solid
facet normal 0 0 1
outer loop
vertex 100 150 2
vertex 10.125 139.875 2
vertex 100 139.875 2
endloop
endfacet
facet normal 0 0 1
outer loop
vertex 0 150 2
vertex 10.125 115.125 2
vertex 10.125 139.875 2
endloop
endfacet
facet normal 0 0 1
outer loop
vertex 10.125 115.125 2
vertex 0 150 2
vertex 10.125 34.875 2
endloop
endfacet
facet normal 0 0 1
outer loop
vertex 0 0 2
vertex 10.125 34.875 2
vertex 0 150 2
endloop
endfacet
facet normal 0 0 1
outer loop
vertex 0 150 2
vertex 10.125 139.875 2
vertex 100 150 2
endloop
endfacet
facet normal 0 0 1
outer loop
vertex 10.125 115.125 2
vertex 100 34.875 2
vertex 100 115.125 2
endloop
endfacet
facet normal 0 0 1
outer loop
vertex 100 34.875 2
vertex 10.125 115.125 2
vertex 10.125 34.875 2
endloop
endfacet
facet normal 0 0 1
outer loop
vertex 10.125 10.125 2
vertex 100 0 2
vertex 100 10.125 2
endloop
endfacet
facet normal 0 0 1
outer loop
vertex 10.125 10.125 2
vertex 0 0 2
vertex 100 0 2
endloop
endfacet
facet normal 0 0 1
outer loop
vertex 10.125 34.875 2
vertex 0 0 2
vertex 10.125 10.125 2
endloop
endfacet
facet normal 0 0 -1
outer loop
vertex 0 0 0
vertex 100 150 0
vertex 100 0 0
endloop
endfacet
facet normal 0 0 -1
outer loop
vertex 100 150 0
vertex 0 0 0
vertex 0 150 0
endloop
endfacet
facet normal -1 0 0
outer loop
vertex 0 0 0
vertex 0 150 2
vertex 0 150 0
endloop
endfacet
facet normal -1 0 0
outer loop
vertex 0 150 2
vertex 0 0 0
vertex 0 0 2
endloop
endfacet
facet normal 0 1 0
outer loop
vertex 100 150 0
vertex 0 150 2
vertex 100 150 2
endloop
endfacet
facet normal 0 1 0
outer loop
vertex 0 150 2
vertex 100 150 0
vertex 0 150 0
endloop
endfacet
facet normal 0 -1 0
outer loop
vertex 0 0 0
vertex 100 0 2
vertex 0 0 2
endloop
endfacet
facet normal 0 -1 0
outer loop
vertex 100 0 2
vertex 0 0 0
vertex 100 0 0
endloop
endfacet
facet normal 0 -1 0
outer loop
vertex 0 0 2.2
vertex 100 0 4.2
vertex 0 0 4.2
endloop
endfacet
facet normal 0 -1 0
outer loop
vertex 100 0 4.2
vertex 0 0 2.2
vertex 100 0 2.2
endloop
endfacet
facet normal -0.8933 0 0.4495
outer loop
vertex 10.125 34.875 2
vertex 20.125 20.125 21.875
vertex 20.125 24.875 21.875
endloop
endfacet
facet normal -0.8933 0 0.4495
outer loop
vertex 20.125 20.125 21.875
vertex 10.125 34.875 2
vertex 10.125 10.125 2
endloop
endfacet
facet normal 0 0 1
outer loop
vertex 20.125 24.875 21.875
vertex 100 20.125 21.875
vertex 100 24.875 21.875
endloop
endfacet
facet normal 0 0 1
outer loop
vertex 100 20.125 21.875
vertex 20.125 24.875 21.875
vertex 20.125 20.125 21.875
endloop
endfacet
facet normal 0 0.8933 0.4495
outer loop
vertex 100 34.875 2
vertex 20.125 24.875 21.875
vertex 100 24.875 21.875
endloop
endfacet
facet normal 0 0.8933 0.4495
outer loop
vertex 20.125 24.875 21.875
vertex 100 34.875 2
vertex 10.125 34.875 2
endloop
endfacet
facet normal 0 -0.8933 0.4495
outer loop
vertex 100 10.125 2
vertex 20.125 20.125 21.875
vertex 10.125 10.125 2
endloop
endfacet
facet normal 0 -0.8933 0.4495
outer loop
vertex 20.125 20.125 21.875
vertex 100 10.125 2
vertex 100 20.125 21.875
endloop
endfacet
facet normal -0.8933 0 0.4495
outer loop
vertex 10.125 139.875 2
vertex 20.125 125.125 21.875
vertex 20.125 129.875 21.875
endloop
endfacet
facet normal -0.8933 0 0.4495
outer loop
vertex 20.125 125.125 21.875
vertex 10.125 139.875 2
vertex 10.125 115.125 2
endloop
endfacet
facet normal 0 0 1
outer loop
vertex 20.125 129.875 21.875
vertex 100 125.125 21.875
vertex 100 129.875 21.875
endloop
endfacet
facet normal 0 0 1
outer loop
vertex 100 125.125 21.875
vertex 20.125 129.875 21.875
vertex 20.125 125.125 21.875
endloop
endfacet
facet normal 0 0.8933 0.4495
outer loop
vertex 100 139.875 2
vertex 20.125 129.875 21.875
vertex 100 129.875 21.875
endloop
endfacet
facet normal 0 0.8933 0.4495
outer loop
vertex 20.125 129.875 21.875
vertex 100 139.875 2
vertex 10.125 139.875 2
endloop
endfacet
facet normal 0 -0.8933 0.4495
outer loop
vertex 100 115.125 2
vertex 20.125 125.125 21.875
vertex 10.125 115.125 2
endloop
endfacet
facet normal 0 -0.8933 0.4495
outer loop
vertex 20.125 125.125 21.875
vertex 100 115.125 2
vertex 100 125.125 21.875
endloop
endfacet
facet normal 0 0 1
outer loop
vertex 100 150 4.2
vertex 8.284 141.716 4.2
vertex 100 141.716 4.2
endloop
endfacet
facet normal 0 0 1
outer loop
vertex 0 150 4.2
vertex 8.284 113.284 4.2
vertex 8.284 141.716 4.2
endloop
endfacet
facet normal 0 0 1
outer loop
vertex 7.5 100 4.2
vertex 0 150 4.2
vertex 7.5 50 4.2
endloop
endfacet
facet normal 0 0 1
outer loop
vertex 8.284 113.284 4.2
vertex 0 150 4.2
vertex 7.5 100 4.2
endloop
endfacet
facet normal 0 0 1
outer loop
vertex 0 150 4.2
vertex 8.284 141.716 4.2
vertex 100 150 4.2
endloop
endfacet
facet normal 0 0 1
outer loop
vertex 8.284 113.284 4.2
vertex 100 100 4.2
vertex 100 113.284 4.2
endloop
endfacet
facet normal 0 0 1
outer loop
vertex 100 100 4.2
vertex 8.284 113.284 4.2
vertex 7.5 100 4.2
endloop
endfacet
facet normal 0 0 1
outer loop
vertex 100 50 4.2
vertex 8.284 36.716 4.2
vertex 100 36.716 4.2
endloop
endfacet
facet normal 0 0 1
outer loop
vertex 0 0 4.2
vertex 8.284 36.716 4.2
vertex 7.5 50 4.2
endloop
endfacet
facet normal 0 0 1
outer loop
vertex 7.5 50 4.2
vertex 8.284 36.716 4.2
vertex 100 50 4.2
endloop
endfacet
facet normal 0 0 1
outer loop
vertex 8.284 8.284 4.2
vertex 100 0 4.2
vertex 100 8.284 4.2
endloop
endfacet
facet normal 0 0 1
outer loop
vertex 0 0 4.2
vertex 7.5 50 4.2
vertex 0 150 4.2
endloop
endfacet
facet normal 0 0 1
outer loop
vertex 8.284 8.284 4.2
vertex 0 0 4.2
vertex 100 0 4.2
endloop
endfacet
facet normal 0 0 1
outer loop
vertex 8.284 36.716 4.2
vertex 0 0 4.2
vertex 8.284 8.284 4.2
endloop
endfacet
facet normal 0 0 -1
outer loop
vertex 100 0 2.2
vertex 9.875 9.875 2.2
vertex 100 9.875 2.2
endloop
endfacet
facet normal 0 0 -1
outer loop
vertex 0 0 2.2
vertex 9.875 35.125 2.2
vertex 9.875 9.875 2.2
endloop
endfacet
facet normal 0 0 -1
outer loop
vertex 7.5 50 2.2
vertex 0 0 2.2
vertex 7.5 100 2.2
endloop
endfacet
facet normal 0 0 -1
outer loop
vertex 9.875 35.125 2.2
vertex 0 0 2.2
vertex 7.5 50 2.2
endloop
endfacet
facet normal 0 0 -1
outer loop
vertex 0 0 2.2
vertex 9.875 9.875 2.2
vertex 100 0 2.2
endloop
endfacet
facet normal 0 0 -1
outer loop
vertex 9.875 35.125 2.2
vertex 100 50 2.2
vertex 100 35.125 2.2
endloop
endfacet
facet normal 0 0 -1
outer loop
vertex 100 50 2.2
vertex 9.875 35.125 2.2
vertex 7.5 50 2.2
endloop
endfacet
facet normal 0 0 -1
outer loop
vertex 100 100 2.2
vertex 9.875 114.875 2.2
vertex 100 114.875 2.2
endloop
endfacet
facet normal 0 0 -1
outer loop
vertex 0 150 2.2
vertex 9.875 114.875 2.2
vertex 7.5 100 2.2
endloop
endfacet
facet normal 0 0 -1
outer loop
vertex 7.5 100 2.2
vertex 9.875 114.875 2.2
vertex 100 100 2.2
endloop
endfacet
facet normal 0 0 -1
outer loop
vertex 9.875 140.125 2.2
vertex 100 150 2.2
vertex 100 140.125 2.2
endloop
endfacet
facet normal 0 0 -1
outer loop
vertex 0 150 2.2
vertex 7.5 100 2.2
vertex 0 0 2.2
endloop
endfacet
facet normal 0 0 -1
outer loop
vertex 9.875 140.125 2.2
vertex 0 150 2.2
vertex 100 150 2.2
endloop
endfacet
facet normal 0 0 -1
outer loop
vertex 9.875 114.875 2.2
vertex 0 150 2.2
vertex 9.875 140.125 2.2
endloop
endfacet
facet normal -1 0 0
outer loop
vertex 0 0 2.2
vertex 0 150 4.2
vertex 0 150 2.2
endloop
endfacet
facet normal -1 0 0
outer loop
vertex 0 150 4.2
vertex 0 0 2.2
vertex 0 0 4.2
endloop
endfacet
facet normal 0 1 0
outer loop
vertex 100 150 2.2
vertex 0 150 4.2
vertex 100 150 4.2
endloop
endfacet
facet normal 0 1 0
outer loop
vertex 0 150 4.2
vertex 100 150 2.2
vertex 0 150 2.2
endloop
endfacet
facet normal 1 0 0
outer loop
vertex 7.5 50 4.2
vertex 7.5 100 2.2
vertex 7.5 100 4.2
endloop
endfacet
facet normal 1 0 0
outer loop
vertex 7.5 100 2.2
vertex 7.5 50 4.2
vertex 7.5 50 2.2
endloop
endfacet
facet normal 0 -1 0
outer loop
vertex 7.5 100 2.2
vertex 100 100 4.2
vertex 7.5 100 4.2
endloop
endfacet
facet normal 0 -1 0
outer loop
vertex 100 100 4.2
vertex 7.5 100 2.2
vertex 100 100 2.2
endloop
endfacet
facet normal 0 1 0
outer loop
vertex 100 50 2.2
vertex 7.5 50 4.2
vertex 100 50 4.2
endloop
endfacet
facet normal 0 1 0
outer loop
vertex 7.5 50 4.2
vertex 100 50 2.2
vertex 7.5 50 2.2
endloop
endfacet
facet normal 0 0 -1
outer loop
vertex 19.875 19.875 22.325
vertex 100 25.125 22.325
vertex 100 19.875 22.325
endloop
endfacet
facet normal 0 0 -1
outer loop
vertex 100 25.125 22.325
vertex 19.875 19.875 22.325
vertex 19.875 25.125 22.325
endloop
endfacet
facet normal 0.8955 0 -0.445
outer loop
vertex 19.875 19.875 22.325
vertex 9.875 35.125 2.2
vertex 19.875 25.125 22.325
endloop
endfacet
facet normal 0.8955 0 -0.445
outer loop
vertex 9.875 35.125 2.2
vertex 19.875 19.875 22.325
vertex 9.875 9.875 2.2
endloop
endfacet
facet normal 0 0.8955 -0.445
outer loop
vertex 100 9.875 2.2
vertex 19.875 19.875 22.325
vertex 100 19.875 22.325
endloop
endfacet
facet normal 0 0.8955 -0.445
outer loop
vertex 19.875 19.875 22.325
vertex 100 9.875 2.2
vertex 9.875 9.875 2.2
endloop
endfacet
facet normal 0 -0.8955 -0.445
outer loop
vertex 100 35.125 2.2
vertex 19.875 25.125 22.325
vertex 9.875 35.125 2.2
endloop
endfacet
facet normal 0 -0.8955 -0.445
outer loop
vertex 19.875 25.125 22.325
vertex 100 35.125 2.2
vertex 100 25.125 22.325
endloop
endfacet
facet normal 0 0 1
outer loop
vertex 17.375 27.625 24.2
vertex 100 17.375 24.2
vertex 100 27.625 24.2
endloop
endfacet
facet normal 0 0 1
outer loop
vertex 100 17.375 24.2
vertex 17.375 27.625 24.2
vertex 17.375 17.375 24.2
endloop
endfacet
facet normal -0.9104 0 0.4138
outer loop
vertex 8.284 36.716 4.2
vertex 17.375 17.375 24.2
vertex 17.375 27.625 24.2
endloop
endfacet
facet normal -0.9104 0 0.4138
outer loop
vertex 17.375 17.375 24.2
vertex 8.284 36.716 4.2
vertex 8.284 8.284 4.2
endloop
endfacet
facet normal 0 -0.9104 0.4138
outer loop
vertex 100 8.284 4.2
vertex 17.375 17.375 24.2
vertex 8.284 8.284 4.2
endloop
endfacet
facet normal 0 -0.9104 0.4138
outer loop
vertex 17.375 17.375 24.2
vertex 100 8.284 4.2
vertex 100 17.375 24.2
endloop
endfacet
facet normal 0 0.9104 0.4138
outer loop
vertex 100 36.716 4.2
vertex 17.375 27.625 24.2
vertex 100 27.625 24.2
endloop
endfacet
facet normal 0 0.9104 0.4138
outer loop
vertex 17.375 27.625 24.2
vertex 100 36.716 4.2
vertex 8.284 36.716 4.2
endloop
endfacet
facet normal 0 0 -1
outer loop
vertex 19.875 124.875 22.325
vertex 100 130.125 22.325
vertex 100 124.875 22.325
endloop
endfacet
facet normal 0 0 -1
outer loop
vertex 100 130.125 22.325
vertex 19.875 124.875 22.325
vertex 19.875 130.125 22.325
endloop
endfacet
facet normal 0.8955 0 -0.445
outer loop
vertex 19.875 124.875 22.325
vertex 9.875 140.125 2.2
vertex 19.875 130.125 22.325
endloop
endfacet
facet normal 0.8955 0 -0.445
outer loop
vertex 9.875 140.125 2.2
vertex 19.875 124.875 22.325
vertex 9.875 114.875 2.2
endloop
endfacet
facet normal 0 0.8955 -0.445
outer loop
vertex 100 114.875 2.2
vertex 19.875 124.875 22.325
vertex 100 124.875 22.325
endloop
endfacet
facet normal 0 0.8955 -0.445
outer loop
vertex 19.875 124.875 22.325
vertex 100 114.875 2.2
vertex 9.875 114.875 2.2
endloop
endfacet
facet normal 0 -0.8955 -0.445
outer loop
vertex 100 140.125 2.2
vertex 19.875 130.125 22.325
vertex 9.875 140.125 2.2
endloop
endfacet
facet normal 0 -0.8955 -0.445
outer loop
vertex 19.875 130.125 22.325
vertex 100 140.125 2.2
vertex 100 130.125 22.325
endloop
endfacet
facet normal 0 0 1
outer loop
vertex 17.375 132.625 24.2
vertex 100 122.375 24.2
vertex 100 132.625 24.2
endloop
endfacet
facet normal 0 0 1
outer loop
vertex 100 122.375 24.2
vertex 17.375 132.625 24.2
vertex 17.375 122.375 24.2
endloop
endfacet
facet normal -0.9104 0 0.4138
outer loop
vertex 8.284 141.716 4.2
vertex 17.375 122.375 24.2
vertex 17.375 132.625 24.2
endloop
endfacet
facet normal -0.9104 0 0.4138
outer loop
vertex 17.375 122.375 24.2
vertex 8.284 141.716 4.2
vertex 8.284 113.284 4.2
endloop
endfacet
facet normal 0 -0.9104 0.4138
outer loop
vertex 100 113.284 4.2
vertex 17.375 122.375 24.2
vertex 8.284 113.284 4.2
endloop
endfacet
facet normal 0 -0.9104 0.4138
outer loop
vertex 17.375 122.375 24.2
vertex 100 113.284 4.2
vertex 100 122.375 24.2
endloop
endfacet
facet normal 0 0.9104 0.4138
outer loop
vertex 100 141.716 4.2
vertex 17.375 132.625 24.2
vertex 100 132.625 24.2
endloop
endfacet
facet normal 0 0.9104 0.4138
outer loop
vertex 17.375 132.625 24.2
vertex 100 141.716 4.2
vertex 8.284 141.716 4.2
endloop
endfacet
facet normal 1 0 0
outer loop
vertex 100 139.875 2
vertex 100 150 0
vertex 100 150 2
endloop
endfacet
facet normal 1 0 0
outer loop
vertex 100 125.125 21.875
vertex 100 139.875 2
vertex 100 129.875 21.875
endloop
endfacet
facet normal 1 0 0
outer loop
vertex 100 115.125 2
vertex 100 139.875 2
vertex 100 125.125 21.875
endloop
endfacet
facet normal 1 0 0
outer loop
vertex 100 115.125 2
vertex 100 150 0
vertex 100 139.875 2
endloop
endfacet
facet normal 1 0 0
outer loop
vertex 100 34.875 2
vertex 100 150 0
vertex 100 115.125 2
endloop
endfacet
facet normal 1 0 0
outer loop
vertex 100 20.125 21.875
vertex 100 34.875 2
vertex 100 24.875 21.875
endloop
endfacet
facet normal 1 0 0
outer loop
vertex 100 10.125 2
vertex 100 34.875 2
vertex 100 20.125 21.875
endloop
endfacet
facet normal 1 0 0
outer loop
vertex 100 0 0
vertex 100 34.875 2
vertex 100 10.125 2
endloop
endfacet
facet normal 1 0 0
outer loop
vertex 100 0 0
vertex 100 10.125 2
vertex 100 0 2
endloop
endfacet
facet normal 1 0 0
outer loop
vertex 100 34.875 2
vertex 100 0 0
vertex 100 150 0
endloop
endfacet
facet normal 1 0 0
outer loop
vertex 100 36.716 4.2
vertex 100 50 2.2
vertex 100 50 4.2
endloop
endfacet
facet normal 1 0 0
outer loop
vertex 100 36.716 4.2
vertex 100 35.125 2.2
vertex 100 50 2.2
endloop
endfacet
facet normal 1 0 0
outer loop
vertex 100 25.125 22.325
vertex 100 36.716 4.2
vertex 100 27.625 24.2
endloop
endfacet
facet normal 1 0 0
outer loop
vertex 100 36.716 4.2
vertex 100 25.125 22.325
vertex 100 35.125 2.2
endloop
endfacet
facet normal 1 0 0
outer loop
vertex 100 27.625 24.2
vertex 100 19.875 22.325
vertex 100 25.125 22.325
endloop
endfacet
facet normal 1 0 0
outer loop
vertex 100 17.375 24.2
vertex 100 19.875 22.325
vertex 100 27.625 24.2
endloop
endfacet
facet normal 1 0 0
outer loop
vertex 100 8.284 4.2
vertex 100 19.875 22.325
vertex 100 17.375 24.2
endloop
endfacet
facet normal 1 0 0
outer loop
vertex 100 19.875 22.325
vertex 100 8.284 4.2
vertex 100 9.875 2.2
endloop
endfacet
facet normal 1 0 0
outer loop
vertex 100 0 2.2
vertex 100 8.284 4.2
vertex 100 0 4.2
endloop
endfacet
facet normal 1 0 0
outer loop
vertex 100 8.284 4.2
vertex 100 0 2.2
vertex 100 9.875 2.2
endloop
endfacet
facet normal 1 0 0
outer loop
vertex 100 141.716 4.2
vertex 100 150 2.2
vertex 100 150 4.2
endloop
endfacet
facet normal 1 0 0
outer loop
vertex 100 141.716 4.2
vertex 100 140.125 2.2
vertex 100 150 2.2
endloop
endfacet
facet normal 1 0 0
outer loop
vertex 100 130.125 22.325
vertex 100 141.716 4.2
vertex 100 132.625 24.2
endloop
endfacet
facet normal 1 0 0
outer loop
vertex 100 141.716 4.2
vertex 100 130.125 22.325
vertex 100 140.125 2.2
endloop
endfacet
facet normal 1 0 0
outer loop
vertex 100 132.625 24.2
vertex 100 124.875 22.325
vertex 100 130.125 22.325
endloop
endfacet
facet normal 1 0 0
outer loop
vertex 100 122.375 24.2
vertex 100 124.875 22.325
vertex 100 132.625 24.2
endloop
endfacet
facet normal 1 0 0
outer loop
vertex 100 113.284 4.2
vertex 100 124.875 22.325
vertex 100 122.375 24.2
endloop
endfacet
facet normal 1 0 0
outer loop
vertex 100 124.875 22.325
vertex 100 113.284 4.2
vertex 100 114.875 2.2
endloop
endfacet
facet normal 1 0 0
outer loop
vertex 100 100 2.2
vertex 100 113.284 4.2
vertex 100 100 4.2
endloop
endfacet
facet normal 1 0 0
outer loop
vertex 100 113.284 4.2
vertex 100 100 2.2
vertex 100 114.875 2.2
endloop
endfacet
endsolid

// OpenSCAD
// file: drone_part.scad
//------------------------------------------------------------------------------
// Cargo holder - drone part
//
// This model contains all parts of the cargo holder mechanism mounted directly
// to the drone.
//
// This model is part of the AutonomousDroneDeliverySystem:
// https://github.com/Andreas-Menzel/AutonomousDroneDeliverySystem
//------------------------------------------------------------------------------
// @author: Andreas Menzel
// @copyright: Copyright (c) 2022 Andreas Menzel
//------------------------------------------------------------------------------


include <dimensions.scad>


module _drone_part__alignment_pin_slot() {
    // Short versions of the variabled needed
    width_base = alignment_pin_width_base;
    length_base = alignment_pin_length_base;
    width_top = alignment_pin_width_top;
    length_top = alignment_pin_length_top;
    height = alignment_pin_height;
    clearance = alignment_pin_clearance / 2;

    plane_wall_thickness = alignment_pin_slot_plane_wall_thickness;
    wall_thickness = alignment_pin_slot_wall_thickness;

    top_width_offset = (width_base - width_top) / 2;
    top_length_offset = (length_base - length_top) / 2;

    points = [
        // base - inner
        [-clearance, -clearance, 0],
        [width_base + clearance, -clearance, 0],
        [width_base + clearance, length_base + clearance, 0],
        [-clearance, length_base + clearance, 0],

        // base - outer
        [-clearance - plane_wall_thickness, -clearance - plane_wall_thickness, 0],
        [width_base + clearance + plane_wall_thickness, -clearance - plane_wall_thickness, 0],
        [width_base + clearance + plane_wall_thickness, length_base + clearance + plane_wall_thickness, 0],
        [-clearance  -plane_wall_thickness, length_base + clearance + plane_wall_thickness, 0],

        // top - inner
        // TODO: With this solution, the angles of the walls are slightly
        //       changed. This is no problem at all, but not very "beautiful",
        //       because I know that it isn't perfect.
        [top_width_offset - clearance, top_length_offset - clearance, height + clearance],
        [top_width_offset + width_top + clearance, top_length_offset - clearance, height + clearance],
        [top_width_offset + width_top + clearance, top_length_offset + length_top + clearance, height + clearance],
        [top_width_offset - clearance, top_length_offset + length_top + clearance, height + clearance],

        // top - outer
        // TODO: With this solution, the angles of the walls are slightly
        //       changed. This is no problem at all, but not very "beautiful",
        //       because I know that it isn't perfect.
        [top_width_offset - clearance - plane_wall_thickness, top_length_offset - clearance - plane_wall_thickness, height + wall_thickness],
        [top_width_offset + width_top + clearance + plane_wall_thickness, top_length_offset - clearance - plane_wall_thickness, height + wall_thickness],
        [top_width_offset + width_top + clearance + plane_wall_thickness, top_length_offset + length_top + clearance + plane_wall_thickness, height + wall_thickness],
        [top_width_offset - clearance - plane_wall_thickness, top_length_offset + length_top + clearance + plane_wall_thickness, height + wall_thickness]
    ];
    
    faces = [
        [8, 9, 10, 11],   // top - inner

        [0, 8, 11, 3],    // left - inner
        [1, 2, 10, 9],    // right - inner

        [9, 8, 0, 1],     // front - inner
        [2, 3, 11, 10],   // back - inner

        [15, 14, 13, 12], // top - outer

        [7, 15, 12, 4],   // left - outer
        [13, 14, 6, 5],   // right - outer

        [5, 4, 12, 13],   // front - outer
        [14, 15, 7, 6],   // back - outer

        [0, 4, 5, 1],     // bottom - front
        [3, 2, 6, 7],     // bottom - back
        [0, 3, 7, 4],     // bottom - left
        [1, 5, 6, 2],     // bottom - right
    ];

    polyhedron(points, faces);
}


module _drone_part__contact_plate() {
    // Short versions of the variabled needed
    width = contact_plate_width;
    length = contact_plate_length;
    wall_thickness = contact_plate_wall_thickness;

    align_width_total = alignment_pin_width_base + 2*alignment_pin_slot_plane_wall_thickness;
    align_length_total = alignment_pin_length_base + 2*alignment_pin_slot_plane_wall_thickness;

    difference() {
        cube([width, length, wall_thickness]);

        // center cutout
        // TODO: Reduce in size. Only needs to be big enough to fit the locking
        //       mechanism of the container part.
        translate([alignment_pin_offset - alignment_pin_slot_plane_wall_thickness, align_length_total + 2*alignment_pin_offset, 0])
            cube([width - 2*(alignment_pin_offset - alignment_pin_slot_plane_wall_thickness),
                  length - 4*alignment_pin_offset - 2 * (align_length_total),
                  wall_thickness]);
        
        // cutout: alignment pin slot - front
        translate([alignment_pin_offset - 0.5*alignment_pin_clearance, alignment_pin_offset - 0.5*alignment_pin_clearance, 0])
            cube([alignment_pin_width_base + alignment_pin_clearance, alignment_pin_length_base + alignment_pin_clearance, wall_thickness]);
        
        // cutout: alignment pin slot - back
        translate([alignment_pin_offset - 0.5*alignment_pin_clearance, length - (alignment_pin_length_base + alignment_pin_clearance) - alignment_pin_offset + 0.5*alignment_pin_clearance, 0])
            cube([alignment_pin_width_base + alignment_pin_clearance, alignment_pin_length_base + alignment_pin_clearance, wall_thickness]);
    }
}


module drone_part() {
    union() {
        _drone_part__contact_plate();

        translate([alignment_pin_offset, alignment_pin_offset, 0])
            _drone_part__alignment_pin_slot();
        translate([alignment_pin_offset, contact_plate_length - alignment_pin_length_base - alignment_pin_offset, 0])
            _drone_part__alignment_pin_slot();
    }
}


// When executing the `export.sh` script, this variable will autimatically be
// set to true. The default value should be false.
export = false;
if(export) {
    drone_part();
}
// file: container_part.scad
//------------------------------------------------------------------------------
// Cargo holder - container part
//
// This model contains all parts of the cargo holder mechanism for the cargo
// container, which can be attached to the drone via the drone_part.scad.
//
// This model is part of the AutonomousDroneDeliverySystem:
// https://github.com/Andreas-Menzel/AutonomousDroneDeliverySystem
//------------------------------------------------------------------------------
// @author: Andreas Menzel
// @copyright: Copyright (c) 2022 Andreas Menzel
//------------------------------------------------------------------------------


include <dimensions.scad>


module _container_part__alignment_pin() {
    // Short versions of the variabled needed
    width_base = alignment_pin_width_base;
    length_base = alignment_pin_length_base;
    width_top = alignment_pin_width_top;
    length_top = alignment_pin_length_top;
    height = alignment_pin_height;
    clearance = alignment_pin_clearance / 2;

    top_width_offset = (width_base - width_top) / 2;
    top_length_offset = (length_base - length_top) / 2;

    points = [
        // base
        [clearance, clearance, 0],
        [width_base - clearance, clearance, 0],
        [width_base - clearance, length_base - clearance, 0],
        [clearance, length_base - clearance, 0],

        // top
        // TODO: With this solution, the angles of the walls are slightly
        //       changed. This is no problem at all, but not very "beautiful",
        //       because I know that it isn't perfect.
        [top_width_offset + clearance, top_length_offset + clearance, height - clearance],
        [top_width_offset + width_top - clearance, top_length_offset + clearance, height - clearance],
        [top_width_offset + width_top - clearance, top_length_offset + length_top - clearance, height - clearance],
        [top_width_offset + clearance, top_length_offset + length_top - clearance, height - clearance]
    ];
    
    faces = [
        [0, 1, 2, 3], // bottom
        [7, 6, 5, 4], // top,

        [3, 7, 4, 0], // left
        [5, 6, 2, 1], // right

        [1, 0, 4, 5], // front
        [6, 7, 3, 2]  // back
    ];

    polyhedron(points, faces);
}


module _container_part__contact_plate() {
    // Short versions of the variabled needed
    width = contact_plate_width;
    length = contact_plate_length;
    wall_thickness = contact_plate_wall_thickness;

    cube([width, length, wall_thickness]);
}


module container_part() {
    union() {
        _container_part__contact_plate();

        translate([alignment_pin_offset, alignment_pin_offset, contact_plate_wall_thickness])
            _container_part__alignment_pin();
        translate([alignment_pin_offset, contact_plate_length - alignment_pin_length_base - alignment_pin_offset, contact_plate_wall_thickness])
            _container_part__alignment_pin();
    }
}


// When executing the `export.sh` script, this variable will autimatically be
// set to true. The default value should be false.
export = false;
if(export) {
    container_part();
}
// file: dimensions.scad
//------------------------------------------------------------------------------
// Cargo holder - dimensions
//
// This file contains the dimensions for the cargo holder mechanism.
//
// This model is part of the AutonomousDroneDeliverySystem:
// https://github.com/Andreas-Menzel/AutonomousDroneDeliverySystem
//------------------------------------------------------------------------------
// @author: Andreas Menzel
// @copyright: Copyright (c) 2022 Andreas Menzel
//------------------------------------------------------------------------------

// Notes:
// - width, length and height are always in relation to the drone, unless
//   explicitly stated otherwise

//////////////////////////////// Contact Plate /////////////////////////////////
// The contact plates of the container- and drone- part touch. They have the
// same size. TODO: Use magnets to help with the alignment of the parts?
contact_plate_width = 150;
contact_plate_length = 150;
contact_plate_wall_thickness = 2;

//////////////////////////////// Alignment Pin /////////////////////////////////
// Pins used to align the cargo container relative to the drone. This mechanism
// can (only) correct small misalignments.

// Offset from the contact plate sides
alignment_pin_offset = 10;

alignment_pin_width_base = contact_plate_width - 2*alignment_pin_offset;
alignment_pin_length_base = 25;

alignment_pin_width_top = alignment_pin_width_base - 20;
alignment_pin_length_top = alignment_pin_length_base - 20;

alignment_pin_height = 20;

alignment_pin_slot_wall_thickness = 2;
// The wall thickness of the alignment pin slot measured in XY-plane. The
// The wall thickness is slightly smaller. TODO: calculate correctly.
alignment_pin_slot_plane_wall_thickness = 2.5;

// Half of the clearance will be added to each part (container / drone)
alignment_pin_clearance = 0.25;
// main file
//------------------------------------------------------------------------------
// Cargo holder - assembled
//
// This model shows the complete, assembled mechanism. This model is not
// intended to be printed; it only functions as a visualisation.
//
// This model is part of the AutonomousDroneDeliverySystem:
// https://github.com/Andreas-Menzel/AutonomousDroneDeliverySystem
//------------------------------------------------------------------------------
// @author: Andreas Menzel
// @copyright: Copyright (c) 2022 Andreas Menzel
//------------------------------------------------------------------------------

include <dimensions.scad>
include <container_part.scad>
include <drone_part.scad>


cut = true;
vertical_gap = 0.2;

difference() {
    union() {
        container_part();

        translate([0, 0, contact_plate_wall_thickness + vertical_gap])
            drone_part();
    }

    // Cut model in half, so that one can see that everything fits.
    if(cut) {
        translate([100, 0, 0])
            cube([1000, 1000, 1000]);
    }
}
